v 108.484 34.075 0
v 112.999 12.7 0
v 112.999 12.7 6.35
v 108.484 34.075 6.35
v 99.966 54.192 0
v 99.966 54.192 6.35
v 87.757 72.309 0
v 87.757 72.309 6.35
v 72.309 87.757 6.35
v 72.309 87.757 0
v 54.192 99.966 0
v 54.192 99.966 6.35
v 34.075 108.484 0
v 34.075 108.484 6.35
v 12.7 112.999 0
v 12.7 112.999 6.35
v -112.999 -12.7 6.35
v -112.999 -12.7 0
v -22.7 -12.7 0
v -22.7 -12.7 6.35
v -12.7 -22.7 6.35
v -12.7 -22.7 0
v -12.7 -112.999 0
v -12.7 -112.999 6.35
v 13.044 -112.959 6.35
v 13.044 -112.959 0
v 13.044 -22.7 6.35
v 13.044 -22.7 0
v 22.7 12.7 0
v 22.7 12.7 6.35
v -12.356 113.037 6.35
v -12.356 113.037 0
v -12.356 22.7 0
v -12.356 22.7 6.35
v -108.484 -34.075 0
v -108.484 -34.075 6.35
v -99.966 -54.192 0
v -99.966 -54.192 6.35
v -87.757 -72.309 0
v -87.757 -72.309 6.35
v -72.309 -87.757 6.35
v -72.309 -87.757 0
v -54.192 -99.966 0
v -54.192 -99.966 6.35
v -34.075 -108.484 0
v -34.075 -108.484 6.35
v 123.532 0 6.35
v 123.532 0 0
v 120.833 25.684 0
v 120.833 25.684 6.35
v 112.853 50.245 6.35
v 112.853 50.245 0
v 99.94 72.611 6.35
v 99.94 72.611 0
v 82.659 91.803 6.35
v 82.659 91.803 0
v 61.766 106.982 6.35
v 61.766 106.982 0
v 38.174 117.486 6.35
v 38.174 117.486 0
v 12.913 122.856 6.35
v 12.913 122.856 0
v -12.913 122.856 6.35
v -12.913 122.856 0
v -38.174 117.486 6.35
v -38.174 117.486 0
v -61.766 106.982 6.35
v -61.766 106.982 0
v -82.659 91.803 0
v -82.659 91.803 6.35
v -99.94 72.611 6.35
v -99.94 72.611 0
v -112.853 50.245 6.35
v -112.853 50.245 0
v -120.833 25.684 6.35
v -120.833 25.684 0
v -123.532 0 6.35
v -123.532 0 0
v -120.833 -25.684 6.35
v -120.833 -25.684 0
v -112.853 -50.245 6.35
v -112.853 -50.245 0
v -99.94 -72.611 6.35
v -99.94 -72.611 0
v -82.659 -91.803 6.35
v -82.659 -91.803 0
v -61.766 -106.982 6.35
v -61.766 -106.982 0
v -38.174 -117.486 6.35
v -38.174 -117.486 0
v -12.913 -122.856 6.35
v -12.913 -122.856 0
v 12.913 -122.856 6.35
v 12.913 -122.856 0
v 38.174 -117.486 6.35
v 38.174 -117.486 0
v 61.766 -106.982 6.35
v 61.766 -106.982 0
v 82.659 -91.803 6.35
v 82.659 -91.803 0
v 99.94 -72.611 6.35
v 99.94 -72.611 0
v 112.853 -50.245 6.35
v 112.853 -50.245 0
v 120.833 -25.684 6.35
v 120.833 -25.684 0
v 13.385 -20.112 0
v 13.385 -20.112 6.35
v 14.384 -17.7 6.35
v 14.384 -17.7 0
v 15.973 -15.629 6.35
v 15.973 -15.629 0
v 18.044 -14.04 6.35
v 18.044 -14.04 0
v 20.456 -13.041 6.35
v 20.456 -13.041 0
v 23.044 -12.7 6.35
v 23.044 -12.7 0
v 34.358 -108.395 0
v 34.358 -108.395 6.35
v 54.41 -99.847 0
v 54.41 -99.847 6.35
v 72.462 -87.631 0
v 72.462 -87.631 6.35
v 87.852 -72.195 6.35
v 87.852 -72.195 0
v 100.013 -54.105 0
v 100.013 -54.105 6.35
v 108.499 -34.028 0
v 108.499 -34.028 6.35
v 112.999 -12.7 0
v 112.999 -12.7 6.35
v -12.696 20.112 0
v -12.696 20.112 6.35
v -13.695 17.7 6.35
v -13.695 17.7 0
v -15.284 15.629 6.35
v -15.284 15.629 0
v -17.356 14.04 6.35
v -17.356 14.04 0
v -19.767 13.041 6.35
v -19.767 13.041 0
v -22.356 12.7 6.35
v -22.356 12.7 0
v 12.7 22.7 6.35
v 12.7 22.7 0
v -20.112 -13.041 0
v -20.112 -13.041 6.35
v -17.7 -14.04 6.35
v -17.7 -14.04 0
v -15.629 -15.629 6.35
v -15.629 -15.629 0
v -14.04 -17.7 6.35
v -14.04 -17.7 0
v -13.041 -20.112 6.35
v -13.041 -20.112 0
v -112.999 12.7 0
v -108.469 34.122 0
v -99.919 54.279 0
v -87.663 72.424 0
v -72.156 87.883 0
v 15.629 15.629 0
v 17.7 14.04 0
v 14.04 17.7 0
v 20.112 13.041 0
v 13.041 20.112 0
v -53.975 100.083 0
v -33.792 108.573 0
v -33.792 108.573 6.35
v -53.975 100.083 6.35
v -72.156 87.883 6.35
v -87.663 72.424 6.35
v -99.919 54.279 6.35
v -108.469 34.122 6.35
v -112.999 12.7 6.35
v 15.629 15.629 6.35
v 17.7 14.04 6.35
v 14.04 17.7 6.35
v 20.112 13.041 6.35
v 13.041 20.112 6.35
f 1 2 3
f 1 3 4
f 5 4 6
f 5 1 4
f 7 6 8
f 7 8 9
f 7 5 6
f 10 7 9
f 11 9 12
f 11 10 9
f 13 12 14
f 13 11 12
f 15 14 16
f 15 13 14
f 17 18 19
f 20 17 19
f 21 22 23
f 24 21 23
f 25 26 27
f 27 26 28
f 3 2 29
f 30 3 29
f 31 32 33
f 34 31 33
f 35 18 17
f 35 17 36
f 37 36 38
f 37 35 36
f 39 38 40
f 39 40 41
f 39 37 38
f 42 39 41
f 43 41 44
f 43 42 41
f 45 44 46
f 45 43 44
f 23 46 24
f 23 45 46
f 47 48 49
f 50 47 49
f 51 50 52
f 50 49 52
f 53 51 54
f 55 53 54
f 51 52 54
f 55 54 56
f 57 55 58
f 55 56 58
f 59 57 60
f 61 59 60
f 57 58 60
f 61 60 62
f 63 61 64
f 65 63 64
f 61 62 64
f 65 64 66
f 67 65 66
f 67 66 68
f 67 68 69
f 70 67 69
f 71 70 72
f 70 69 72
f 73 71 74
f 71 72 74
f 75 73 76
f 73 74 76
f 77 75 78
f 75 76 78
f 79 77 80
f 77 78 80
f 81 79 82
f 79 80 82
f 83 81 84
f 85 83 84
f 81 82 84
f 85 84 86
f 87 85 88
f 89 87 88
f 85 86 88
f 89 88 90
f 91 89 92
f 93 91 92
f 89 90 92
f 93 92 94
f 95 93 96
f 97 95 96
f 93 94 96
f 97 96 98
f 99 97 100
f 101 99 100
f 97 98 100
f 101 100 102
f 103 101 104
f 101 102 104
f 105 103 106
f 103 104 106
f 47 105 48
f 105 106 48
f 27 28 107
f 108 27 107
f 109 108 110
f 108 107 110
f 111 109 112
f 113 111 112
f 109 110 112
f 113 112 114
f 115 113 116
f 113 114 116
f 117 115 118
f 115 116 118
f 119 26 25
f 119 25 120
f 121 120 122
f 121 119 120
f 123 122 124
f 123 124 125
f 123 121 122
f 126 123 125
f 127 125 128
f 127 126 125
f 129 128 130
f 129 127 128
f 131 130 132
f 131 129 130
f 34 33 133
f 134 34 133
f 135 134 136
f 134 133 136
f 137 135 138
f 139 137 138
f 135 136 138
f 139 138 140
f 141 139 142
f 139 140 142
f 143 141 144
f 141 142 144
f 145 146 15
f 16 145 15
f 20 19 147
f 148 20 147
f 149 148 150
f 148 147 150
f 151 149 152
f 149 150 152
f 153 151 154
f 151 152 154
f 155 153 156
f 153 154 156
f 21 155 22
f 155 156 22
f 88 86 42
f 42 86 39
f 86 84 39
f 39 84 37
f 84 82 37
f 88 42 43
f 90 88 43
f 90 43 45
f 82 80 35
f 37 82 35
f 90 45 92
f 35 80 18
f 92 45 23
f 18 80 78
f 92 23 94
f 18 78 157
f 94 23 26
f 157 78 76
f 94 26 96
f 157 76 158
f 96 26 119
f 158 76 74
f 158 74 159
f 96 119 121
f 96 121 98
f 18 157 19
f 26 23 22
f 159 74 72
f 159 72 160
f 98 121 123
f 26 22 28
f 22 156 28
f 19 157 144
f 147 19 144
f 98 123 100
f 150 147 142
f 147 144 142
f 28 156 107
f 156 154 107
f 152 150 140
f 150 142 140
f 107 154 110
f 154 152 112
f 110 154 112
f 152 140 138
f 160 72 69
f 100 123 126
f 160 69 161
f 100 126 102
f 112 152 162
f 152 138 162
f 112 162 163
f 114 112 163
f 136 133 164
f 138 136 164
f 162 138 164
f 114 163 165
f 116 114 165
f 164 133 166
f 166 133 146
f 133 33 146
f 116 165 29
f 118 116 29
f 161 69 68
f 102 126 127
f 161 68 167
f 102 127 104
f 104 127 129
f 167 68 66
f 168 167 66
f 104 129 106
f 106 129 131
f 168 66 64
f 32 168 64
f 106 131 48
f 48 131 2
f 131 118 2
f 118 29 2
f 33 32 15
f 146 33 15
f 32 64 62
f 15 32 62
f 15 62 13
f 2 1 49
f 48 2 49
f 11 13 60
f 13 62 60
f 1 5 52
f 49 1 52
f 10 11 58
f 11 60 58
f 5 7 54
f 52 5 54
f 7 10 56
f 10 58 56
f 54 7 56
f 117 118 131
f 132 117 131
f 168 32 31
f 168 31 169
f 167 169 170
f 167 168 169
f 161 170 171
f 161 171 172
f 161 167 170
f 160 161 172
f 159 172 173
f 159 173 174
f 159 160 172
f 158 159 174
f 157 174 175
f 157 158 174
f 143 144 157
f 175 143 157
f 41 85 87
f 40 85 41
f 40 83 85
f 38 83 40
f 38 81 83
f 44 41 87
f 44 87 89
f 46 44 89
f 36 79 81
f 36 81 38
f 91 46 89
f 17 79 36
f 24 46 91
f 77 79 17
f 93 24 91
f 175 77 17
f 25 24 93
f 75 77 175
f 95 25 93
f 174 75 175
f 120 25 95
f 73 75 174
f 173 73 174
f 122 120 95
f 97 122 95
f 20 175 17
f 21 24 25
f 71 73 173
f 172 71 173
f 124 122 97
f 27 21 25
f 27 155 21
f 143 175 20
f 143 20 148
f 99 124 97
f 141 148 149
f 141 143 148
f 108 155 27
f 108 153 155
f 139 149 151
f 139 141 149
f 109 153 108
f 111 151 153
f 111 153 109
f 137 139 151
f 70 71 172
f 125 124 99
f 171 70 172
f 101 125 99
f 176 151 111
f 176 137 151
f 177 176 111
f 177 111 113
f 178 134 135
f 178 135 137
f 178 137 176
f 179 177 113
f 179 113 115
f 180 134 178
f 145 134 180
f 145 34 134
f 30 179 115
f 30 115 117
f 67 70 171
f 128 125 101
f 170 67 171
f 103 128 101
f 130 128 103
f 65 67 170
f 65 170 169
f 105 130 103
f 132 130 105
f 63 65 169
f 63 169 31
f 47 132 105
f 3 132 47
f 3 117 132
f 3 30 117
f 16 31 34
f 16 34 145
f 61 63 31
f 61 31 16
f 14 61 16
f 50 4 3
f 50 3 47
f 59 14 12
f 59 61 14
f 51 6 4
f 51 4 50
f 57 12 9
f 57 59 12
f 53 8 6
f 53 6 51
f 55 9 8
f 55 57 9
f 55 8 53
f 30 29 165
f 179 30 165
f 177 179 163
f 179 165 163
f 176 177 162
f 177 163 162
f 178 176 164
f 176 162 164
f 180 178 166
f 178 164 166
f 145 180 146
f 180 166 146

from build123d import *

# Parameters (mm, degrees)
SKETCH1_R           = 123.5325
SKETCH1_R_2         = 113.71
BOSS_EXTRUDE1_DEPTH = 6.35


with BuildPart() as part:
    # Sketch1 → Boss-Extrude1 (new body)
    # profile 1 of 2: a face of its own
    with BuildSketch(Plane.XY):
        Circle(SKETCH1_R)
        Circle(SKETCH1_R_2, mode=Mode.SUBTRACT)
    # profile 2 of 2: a face of its own
    with BuildSketch(Plane.XY):
        with BuildLine():
            ThreePointArc((22.7, 12.7), (15.628932188, 15.628932188), (12.7, 22.7))
            Line((12.7, 22.7), (12.7, 112.998557955))
            ThreePointArc((12.7, 112.998557955), (0.173278497, 113.709867974), (-12.355552704, 113.036739237))
            Line((-12.355552704, 113.036739237), (-12.355552704, 22.7))
            ThreePointArc((-12.355552704, 22.7), (-15.284484892, 15.628932188), (-22.355552704, 12.7))
            Line((-22.355552704, 12.7), (-112.998557955, 12.7))
            ThreePointArc((-112.998557955, 12.7), (-113.71, 0), (-112.998557955, -12.7))
            Line((-112.998557955, -12.7), (-22.7, -12.7))
            ThreePointArc((-22.7, -12.7), (-15.628932188, -15.628932188), (-12.7, -22.7))
            Line((-12.7, -22.7), (-12.7, -112.998557955))
            ThreePointArc((-12.7, -112.998557955), (0.173337872, -113.709867883), (13.044447296, -112.959313448))
            Line((13.044447296, -112.959313448), (13.044447296, -22.7))
            ThreePointArc((13.044447296, -22.7), (15.973379485, -15.628932188), (23.044447296, -12.7))
            Line((23.044447296, -12.7), (112.998557955, -12.7))
            ThreePointArc((112.998557955, -12.7), (113.53200017, -6.359955774), (113.71, 0))
            ThreePointArc((113.71, 0), (113.53200017, 6.359955774), (112.998557955, 12.7))
            Line((112.998557955, 12.7), (22.7, 12.7))
        make_face()
    extrude(amount=BOSS_EXTRUDE1_DEPTH)


solid = part.part
